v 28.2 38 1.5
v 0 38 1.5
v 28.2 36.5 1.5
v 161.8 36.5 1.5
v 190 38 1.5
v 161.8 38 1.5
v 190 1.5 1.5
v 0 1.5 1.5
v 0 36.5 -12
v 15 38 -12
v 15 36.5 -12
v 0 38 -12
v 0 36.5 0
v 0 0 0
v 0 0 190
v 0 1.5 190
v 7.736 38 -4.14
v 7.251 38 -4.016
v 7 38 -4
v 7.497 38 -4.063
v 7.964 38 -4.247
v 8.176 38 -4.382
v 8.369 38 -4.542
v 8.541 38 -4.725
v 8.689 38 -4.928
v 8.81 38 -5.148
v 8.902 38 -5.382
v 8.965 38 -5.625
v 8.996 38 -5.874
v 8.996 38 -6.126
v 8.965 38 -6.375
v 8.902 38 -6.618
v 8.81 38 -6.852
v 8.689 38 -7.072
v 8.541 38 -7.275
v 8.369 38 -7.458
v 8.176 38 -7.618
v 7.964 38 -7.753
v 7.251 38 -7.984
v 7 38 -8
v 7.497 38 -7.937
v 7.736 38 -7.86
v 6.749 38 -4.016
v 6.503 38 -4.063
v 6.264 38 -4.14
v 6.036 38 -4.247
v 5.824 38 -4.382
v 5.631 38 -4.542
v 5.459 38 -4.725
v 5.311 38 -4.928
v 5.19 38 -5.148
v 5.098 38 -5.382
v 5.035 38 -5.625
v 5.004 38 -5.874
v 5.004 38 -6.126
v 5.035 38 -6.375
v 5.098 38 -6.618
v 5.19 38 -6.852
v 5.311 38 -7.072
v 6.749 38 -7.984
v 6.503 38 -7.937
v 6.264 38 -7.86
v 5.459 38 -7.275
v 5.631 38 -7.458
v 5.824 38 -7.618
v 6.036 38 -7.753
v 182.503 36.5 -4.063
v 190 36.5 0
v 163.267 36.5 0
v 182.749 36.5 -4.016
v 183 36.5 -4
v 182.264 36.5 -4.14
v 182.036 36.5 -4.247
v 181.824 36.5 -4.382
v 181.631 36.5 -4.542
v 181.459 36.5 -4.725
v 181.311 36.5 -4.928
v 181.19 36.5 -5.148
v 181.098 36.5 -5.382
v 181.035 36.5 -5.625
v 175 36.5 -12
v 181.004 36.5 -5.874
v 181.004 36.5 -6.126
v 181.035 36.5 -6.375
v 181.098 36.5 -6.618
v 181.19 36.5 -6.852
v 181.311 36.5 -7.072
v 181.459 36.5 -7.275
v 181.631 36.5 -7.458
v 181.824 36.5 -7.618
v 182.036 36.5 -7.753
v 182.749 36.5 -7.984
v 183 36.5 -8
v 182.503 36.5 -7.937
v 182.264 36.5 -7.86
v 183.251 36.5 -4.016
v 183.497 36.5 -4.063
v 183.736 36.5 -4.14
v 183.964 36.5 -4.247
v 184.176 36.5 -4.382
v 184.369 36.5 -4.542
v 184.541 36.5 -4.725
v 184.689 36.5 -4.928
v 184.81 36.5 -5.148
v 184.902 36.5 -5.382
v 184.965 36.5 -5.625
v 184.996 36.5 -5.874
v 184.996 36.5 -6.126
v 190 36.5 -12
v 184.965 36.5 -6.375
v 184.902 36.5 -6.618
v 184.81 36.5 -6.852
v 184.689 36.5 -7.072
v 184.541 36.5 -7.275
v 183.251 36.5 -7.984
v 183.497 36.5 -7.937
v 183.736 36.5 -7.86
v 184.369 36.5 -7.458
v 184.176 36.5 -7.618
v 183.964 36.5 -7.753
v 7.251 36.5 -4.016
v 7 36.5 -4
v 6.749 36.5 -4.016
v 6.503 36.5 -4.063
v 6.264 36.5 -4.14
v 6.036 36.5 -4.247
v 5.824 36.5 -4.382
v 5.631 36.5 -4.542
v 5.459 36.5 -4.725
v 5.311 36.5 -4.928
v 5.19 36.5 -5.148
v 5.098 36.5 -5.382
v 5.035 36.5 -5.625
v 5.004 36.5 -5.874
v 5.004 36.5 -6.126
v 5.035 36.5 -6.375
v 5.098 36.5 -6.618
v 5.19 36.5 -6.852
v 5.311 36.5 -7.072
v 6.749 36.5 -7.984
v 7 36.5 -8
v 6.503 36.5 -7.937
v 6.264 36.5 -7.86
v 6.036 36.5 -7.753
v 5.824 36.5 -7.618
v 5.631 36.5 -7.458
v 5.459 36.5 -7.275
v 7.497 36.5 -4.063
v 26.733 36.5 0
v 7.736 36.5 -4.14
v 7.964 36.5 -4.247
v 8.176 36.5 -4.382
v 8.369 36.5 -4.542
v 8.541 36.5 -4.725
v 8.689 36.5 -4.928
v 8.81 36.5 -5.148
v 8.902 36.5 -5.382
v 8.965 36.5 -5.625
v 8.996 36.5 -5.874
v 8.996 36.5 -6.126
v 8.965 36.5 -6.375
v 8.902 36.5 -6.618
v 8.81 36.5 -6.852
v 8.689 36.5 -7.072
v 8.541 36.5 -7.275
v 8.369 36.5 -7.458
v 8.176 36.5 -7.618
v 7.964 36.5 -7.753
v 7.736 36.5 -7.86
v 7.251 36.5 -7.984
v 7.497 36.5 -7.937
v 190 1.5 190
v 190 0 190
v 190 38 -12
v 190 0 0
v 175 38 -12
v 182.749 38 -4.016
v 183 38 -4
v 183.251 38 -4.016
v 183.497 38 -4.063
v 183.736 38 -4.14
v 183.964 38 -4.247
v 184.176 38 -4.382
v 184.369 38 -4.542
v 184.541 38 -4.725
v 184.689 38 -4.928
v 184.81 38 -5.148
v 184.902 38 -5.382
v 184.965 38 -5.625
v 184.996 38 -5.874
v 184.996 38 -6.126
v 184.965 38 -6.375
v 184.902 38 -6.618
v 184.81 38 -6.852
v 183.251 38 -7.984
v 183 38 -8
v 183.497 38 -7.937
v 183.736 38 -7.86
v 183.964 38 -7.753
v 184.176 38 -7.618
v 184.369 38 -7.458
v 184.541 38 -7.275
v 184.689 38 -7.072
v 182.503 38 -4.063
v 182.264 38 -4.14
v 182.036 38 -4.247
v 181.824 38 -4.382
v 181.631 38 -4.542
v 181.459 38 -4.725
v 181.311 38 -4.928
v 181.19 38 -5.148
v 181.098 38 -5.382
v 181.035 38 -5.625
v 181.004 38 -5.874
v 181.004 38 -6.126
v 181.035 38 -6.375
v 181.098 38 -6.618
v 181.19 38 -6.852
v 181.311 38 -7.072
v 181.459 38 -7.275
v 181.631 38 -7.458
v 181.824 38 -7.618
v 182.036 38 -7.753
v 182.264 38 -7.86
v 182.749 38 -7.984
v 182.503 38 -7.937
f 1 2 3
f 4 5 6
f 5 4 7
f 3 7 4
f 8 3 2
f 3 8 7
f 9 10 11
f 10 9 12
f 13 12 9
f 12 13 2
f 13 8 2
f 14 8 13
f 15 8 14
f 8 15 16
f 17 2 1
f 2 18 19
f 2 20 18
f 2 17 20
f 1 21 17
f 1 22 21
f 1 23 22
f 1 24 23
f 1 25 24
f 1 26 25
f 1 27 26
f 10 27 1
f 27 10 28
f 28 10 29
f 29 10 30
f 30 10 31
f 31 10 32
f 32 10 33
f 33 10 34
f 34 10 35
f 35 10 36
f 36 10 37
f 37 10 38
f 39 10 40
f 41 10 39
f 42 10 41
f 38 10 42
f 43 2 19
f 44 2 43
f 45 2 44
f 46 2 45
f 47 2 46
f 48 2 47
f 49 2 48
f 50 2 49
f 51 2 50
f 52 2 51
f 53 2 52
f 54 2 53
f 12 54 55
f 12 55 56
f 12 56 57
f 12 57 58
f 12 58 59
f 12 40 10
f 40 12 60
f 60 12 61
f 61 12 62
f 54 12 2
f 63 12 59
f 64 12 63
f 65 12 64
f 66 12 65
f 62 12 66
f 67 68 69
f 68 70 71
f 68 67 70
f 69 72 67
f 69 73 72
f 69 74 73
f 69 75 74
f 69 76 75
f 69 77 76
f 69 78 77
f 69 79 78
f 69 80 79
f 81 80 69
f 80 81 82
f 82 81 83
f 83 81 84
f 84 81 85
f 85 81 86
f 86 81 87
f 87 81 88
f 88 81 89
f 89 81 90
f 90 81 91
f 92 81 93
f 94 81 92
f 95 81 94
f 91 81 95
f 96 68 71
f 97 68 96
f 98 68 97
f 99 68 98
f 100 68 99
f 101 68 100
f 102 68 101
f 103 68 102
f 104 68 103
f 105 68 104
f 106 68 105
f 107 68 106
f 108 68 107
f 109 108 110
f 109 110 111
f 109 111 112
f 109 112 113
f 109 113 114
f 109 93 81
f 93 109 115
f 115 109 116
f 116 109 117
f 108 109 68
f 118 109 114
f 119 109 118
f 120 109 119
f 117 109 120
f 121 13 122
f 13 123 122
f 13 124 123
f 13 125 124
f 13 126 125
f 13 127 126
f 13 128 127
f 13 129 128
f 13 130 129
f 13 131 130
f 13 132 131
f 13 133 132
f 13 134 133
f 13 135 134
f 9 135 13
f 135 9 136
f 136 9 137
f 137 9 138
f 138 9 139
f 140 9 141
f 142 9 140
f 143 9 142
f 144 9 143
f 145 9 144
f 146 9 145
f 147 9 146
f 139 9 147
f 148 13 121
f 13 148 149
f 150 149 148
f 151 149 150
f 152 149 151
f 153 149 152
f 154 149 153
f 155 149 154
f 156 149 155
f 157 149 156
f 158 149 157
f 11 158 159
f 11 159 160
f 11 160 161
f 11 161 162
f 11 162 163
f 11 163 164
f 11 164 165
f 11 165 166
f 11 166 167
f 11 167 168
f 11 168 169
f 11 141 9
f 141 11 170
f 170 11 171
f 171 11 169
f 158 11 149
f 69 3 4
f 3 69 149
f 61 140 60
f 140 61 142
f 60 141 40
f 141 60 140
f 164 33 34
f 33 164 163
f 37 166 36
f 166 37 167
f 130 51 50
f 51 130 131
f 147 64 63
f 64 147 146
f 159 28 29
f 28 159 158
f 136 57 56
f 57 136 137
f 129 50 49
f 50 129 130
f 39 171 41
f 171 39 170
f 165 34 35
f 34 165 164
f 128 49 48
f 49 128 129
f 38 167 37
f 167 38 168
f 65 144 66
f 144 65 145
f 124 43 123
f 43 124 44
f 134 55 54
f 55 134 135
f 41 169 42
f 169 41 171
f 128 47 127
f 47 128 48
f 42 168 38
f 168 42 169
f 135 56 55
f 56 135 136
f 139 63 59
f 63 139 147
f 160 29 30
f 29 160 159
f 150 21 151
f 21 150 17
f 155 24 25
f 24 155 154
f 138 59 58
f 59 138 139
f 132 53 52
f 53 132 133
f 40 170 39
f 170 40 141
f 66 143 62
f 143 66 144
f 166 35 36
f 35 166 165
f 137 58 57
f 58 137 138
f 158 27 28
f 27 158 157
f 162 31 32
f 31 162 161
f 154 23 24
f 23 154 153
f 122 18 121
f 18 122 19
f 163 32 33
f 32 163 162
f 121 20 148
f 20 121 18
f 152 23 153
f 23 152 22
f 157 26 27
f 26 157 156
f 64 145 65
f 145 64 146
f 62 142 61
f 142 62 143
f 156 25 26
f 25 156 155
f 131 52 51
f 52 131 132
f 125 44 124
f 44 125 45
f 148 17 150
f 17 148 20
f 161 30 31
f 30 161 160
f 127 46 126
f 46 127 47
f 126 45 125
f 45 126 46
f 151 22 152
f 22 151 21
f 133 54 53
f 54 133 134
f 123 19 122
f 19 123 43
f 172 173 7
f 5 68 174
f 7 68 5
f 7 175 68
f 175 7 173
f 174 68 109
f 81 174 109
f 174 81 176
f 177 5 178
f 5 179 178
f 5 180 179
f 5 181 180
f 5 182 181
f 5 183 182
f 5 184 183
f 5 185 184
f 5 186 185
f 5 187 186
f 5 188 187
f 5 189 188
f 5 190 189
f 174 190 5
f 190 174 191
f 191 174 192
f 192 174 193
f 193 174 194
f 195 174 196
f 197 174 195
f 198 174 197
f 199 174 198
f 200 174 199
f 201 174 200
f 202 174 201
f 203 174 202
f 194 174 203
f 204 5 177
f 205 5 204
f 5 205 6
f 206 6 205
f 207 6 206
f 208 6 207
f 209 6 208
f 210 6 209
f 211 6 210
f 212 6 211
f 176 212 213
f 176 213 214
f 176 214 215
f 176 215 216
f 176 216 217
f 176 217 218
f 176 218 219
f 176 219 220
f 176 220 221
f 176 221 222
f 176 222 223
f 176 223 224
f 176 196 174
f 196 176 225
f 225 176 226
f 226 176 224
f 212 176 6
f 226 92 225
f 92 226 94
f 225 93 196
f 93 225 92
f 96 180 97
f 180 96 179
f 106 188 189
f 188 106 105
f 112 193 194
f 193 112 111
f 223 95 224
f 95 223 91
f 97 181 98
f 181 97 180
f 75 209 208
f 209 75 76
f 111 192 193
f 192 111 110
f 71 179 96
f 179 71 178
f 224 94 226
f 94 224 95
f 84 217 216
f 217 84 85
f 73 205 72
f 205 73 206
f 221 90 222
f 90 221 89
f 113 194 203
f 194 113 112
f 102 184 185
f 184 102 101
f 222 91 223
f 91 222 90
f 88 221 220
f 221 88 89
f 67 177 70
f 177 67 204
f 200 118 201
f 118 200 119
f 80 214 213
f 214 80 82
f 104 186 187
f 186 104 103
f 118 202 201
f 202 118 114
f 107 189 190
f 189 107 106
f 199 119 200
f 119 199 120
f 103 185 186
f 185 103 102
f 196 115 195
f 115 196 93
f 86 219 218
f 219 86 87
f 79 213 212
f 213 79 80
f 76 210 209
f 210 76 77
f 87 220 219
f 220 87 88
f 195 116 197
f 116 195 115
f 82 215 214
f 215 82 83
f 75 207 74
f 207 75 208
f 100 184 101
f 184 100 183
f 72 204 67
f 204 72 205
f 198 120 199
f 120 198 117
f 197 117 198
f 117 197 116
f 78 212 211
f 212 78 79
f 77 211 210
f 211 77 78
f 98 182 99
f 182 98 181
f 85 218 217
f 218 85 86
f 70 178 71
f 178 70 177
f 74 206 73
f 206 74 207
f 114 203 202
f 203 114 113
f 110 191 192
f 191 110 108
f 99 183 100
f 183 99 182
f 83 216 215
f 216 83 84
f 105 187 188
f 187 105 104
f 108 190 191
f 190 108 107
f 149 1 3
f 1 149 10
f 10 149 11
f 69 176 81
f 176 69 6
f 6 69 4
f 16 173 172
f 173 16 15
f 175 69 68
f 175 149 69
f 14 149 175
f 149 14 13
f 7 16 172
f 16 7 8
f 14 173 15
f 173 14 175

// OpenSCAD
use <MCAD/triangles.scad>;

inner_wall_height = 190;

wall_thickness = 1.5;

horizontal_piece_depth = 35;

front_wall_height = 12;

width = 190;

screw_diameter = 4;

screw_offset = 7;

screw_piece_width = 15;

translate([screw_piece_width, horizontal_piece_depth + wall_thickness*2,wall_thickness]) rotate([180,90,90]) triangle(front_wall_height * 1.1,front_wall_height + wall_thickness,wall_thickness);

translate([width - screw_piece_width, horizontal_piece_depth + wall_thickness,wall_thickness]) rotate([0,90,90]) triangle(front_wall_height * 1.1,front_wall_height + wall_thickness,wall_thickness);


// large inner wall
cube([width, wall_thickness, inner_wall_height]);

// horizontal piece
translate([0, wall_thickness, 0]) cube([width, horizontal_piece_depth, wall_thickness]);

// pieces connecting to the screws
difference()
{
    translate([0, wall_thickness + horizontal_piece_depth, - (front_wall_height)]) cube([screw_piece_width, wall_thickness, front_wall_height + wall_thickness]);
    
    translate([screw_offset, horizontal_piece_depth + wall_thickness / 2, -front_wall_height/2]) rotate(a=[0,90,90]) cylinder(h = 10 * wall_thickness, r = screw_diameter / 2, $fn=50, center = true);

}

difference()
{
    translate([width - screw_piece_width, wall_thickness + horizontal_piece_depth, - (front_wall_height)]) cube([screw_piece_width, wall_thickness, front_wall_height + wall_thickness]);
    translate([width - screw_offset, horizontal_piece_depth + wall_thickness / 2, -front_wall_height/2]) rotate(a=[0,90,90]) cylinder(h = 10 * wall_thickness, r = screw_diameter / 2, $fn=50, center = true);
}
